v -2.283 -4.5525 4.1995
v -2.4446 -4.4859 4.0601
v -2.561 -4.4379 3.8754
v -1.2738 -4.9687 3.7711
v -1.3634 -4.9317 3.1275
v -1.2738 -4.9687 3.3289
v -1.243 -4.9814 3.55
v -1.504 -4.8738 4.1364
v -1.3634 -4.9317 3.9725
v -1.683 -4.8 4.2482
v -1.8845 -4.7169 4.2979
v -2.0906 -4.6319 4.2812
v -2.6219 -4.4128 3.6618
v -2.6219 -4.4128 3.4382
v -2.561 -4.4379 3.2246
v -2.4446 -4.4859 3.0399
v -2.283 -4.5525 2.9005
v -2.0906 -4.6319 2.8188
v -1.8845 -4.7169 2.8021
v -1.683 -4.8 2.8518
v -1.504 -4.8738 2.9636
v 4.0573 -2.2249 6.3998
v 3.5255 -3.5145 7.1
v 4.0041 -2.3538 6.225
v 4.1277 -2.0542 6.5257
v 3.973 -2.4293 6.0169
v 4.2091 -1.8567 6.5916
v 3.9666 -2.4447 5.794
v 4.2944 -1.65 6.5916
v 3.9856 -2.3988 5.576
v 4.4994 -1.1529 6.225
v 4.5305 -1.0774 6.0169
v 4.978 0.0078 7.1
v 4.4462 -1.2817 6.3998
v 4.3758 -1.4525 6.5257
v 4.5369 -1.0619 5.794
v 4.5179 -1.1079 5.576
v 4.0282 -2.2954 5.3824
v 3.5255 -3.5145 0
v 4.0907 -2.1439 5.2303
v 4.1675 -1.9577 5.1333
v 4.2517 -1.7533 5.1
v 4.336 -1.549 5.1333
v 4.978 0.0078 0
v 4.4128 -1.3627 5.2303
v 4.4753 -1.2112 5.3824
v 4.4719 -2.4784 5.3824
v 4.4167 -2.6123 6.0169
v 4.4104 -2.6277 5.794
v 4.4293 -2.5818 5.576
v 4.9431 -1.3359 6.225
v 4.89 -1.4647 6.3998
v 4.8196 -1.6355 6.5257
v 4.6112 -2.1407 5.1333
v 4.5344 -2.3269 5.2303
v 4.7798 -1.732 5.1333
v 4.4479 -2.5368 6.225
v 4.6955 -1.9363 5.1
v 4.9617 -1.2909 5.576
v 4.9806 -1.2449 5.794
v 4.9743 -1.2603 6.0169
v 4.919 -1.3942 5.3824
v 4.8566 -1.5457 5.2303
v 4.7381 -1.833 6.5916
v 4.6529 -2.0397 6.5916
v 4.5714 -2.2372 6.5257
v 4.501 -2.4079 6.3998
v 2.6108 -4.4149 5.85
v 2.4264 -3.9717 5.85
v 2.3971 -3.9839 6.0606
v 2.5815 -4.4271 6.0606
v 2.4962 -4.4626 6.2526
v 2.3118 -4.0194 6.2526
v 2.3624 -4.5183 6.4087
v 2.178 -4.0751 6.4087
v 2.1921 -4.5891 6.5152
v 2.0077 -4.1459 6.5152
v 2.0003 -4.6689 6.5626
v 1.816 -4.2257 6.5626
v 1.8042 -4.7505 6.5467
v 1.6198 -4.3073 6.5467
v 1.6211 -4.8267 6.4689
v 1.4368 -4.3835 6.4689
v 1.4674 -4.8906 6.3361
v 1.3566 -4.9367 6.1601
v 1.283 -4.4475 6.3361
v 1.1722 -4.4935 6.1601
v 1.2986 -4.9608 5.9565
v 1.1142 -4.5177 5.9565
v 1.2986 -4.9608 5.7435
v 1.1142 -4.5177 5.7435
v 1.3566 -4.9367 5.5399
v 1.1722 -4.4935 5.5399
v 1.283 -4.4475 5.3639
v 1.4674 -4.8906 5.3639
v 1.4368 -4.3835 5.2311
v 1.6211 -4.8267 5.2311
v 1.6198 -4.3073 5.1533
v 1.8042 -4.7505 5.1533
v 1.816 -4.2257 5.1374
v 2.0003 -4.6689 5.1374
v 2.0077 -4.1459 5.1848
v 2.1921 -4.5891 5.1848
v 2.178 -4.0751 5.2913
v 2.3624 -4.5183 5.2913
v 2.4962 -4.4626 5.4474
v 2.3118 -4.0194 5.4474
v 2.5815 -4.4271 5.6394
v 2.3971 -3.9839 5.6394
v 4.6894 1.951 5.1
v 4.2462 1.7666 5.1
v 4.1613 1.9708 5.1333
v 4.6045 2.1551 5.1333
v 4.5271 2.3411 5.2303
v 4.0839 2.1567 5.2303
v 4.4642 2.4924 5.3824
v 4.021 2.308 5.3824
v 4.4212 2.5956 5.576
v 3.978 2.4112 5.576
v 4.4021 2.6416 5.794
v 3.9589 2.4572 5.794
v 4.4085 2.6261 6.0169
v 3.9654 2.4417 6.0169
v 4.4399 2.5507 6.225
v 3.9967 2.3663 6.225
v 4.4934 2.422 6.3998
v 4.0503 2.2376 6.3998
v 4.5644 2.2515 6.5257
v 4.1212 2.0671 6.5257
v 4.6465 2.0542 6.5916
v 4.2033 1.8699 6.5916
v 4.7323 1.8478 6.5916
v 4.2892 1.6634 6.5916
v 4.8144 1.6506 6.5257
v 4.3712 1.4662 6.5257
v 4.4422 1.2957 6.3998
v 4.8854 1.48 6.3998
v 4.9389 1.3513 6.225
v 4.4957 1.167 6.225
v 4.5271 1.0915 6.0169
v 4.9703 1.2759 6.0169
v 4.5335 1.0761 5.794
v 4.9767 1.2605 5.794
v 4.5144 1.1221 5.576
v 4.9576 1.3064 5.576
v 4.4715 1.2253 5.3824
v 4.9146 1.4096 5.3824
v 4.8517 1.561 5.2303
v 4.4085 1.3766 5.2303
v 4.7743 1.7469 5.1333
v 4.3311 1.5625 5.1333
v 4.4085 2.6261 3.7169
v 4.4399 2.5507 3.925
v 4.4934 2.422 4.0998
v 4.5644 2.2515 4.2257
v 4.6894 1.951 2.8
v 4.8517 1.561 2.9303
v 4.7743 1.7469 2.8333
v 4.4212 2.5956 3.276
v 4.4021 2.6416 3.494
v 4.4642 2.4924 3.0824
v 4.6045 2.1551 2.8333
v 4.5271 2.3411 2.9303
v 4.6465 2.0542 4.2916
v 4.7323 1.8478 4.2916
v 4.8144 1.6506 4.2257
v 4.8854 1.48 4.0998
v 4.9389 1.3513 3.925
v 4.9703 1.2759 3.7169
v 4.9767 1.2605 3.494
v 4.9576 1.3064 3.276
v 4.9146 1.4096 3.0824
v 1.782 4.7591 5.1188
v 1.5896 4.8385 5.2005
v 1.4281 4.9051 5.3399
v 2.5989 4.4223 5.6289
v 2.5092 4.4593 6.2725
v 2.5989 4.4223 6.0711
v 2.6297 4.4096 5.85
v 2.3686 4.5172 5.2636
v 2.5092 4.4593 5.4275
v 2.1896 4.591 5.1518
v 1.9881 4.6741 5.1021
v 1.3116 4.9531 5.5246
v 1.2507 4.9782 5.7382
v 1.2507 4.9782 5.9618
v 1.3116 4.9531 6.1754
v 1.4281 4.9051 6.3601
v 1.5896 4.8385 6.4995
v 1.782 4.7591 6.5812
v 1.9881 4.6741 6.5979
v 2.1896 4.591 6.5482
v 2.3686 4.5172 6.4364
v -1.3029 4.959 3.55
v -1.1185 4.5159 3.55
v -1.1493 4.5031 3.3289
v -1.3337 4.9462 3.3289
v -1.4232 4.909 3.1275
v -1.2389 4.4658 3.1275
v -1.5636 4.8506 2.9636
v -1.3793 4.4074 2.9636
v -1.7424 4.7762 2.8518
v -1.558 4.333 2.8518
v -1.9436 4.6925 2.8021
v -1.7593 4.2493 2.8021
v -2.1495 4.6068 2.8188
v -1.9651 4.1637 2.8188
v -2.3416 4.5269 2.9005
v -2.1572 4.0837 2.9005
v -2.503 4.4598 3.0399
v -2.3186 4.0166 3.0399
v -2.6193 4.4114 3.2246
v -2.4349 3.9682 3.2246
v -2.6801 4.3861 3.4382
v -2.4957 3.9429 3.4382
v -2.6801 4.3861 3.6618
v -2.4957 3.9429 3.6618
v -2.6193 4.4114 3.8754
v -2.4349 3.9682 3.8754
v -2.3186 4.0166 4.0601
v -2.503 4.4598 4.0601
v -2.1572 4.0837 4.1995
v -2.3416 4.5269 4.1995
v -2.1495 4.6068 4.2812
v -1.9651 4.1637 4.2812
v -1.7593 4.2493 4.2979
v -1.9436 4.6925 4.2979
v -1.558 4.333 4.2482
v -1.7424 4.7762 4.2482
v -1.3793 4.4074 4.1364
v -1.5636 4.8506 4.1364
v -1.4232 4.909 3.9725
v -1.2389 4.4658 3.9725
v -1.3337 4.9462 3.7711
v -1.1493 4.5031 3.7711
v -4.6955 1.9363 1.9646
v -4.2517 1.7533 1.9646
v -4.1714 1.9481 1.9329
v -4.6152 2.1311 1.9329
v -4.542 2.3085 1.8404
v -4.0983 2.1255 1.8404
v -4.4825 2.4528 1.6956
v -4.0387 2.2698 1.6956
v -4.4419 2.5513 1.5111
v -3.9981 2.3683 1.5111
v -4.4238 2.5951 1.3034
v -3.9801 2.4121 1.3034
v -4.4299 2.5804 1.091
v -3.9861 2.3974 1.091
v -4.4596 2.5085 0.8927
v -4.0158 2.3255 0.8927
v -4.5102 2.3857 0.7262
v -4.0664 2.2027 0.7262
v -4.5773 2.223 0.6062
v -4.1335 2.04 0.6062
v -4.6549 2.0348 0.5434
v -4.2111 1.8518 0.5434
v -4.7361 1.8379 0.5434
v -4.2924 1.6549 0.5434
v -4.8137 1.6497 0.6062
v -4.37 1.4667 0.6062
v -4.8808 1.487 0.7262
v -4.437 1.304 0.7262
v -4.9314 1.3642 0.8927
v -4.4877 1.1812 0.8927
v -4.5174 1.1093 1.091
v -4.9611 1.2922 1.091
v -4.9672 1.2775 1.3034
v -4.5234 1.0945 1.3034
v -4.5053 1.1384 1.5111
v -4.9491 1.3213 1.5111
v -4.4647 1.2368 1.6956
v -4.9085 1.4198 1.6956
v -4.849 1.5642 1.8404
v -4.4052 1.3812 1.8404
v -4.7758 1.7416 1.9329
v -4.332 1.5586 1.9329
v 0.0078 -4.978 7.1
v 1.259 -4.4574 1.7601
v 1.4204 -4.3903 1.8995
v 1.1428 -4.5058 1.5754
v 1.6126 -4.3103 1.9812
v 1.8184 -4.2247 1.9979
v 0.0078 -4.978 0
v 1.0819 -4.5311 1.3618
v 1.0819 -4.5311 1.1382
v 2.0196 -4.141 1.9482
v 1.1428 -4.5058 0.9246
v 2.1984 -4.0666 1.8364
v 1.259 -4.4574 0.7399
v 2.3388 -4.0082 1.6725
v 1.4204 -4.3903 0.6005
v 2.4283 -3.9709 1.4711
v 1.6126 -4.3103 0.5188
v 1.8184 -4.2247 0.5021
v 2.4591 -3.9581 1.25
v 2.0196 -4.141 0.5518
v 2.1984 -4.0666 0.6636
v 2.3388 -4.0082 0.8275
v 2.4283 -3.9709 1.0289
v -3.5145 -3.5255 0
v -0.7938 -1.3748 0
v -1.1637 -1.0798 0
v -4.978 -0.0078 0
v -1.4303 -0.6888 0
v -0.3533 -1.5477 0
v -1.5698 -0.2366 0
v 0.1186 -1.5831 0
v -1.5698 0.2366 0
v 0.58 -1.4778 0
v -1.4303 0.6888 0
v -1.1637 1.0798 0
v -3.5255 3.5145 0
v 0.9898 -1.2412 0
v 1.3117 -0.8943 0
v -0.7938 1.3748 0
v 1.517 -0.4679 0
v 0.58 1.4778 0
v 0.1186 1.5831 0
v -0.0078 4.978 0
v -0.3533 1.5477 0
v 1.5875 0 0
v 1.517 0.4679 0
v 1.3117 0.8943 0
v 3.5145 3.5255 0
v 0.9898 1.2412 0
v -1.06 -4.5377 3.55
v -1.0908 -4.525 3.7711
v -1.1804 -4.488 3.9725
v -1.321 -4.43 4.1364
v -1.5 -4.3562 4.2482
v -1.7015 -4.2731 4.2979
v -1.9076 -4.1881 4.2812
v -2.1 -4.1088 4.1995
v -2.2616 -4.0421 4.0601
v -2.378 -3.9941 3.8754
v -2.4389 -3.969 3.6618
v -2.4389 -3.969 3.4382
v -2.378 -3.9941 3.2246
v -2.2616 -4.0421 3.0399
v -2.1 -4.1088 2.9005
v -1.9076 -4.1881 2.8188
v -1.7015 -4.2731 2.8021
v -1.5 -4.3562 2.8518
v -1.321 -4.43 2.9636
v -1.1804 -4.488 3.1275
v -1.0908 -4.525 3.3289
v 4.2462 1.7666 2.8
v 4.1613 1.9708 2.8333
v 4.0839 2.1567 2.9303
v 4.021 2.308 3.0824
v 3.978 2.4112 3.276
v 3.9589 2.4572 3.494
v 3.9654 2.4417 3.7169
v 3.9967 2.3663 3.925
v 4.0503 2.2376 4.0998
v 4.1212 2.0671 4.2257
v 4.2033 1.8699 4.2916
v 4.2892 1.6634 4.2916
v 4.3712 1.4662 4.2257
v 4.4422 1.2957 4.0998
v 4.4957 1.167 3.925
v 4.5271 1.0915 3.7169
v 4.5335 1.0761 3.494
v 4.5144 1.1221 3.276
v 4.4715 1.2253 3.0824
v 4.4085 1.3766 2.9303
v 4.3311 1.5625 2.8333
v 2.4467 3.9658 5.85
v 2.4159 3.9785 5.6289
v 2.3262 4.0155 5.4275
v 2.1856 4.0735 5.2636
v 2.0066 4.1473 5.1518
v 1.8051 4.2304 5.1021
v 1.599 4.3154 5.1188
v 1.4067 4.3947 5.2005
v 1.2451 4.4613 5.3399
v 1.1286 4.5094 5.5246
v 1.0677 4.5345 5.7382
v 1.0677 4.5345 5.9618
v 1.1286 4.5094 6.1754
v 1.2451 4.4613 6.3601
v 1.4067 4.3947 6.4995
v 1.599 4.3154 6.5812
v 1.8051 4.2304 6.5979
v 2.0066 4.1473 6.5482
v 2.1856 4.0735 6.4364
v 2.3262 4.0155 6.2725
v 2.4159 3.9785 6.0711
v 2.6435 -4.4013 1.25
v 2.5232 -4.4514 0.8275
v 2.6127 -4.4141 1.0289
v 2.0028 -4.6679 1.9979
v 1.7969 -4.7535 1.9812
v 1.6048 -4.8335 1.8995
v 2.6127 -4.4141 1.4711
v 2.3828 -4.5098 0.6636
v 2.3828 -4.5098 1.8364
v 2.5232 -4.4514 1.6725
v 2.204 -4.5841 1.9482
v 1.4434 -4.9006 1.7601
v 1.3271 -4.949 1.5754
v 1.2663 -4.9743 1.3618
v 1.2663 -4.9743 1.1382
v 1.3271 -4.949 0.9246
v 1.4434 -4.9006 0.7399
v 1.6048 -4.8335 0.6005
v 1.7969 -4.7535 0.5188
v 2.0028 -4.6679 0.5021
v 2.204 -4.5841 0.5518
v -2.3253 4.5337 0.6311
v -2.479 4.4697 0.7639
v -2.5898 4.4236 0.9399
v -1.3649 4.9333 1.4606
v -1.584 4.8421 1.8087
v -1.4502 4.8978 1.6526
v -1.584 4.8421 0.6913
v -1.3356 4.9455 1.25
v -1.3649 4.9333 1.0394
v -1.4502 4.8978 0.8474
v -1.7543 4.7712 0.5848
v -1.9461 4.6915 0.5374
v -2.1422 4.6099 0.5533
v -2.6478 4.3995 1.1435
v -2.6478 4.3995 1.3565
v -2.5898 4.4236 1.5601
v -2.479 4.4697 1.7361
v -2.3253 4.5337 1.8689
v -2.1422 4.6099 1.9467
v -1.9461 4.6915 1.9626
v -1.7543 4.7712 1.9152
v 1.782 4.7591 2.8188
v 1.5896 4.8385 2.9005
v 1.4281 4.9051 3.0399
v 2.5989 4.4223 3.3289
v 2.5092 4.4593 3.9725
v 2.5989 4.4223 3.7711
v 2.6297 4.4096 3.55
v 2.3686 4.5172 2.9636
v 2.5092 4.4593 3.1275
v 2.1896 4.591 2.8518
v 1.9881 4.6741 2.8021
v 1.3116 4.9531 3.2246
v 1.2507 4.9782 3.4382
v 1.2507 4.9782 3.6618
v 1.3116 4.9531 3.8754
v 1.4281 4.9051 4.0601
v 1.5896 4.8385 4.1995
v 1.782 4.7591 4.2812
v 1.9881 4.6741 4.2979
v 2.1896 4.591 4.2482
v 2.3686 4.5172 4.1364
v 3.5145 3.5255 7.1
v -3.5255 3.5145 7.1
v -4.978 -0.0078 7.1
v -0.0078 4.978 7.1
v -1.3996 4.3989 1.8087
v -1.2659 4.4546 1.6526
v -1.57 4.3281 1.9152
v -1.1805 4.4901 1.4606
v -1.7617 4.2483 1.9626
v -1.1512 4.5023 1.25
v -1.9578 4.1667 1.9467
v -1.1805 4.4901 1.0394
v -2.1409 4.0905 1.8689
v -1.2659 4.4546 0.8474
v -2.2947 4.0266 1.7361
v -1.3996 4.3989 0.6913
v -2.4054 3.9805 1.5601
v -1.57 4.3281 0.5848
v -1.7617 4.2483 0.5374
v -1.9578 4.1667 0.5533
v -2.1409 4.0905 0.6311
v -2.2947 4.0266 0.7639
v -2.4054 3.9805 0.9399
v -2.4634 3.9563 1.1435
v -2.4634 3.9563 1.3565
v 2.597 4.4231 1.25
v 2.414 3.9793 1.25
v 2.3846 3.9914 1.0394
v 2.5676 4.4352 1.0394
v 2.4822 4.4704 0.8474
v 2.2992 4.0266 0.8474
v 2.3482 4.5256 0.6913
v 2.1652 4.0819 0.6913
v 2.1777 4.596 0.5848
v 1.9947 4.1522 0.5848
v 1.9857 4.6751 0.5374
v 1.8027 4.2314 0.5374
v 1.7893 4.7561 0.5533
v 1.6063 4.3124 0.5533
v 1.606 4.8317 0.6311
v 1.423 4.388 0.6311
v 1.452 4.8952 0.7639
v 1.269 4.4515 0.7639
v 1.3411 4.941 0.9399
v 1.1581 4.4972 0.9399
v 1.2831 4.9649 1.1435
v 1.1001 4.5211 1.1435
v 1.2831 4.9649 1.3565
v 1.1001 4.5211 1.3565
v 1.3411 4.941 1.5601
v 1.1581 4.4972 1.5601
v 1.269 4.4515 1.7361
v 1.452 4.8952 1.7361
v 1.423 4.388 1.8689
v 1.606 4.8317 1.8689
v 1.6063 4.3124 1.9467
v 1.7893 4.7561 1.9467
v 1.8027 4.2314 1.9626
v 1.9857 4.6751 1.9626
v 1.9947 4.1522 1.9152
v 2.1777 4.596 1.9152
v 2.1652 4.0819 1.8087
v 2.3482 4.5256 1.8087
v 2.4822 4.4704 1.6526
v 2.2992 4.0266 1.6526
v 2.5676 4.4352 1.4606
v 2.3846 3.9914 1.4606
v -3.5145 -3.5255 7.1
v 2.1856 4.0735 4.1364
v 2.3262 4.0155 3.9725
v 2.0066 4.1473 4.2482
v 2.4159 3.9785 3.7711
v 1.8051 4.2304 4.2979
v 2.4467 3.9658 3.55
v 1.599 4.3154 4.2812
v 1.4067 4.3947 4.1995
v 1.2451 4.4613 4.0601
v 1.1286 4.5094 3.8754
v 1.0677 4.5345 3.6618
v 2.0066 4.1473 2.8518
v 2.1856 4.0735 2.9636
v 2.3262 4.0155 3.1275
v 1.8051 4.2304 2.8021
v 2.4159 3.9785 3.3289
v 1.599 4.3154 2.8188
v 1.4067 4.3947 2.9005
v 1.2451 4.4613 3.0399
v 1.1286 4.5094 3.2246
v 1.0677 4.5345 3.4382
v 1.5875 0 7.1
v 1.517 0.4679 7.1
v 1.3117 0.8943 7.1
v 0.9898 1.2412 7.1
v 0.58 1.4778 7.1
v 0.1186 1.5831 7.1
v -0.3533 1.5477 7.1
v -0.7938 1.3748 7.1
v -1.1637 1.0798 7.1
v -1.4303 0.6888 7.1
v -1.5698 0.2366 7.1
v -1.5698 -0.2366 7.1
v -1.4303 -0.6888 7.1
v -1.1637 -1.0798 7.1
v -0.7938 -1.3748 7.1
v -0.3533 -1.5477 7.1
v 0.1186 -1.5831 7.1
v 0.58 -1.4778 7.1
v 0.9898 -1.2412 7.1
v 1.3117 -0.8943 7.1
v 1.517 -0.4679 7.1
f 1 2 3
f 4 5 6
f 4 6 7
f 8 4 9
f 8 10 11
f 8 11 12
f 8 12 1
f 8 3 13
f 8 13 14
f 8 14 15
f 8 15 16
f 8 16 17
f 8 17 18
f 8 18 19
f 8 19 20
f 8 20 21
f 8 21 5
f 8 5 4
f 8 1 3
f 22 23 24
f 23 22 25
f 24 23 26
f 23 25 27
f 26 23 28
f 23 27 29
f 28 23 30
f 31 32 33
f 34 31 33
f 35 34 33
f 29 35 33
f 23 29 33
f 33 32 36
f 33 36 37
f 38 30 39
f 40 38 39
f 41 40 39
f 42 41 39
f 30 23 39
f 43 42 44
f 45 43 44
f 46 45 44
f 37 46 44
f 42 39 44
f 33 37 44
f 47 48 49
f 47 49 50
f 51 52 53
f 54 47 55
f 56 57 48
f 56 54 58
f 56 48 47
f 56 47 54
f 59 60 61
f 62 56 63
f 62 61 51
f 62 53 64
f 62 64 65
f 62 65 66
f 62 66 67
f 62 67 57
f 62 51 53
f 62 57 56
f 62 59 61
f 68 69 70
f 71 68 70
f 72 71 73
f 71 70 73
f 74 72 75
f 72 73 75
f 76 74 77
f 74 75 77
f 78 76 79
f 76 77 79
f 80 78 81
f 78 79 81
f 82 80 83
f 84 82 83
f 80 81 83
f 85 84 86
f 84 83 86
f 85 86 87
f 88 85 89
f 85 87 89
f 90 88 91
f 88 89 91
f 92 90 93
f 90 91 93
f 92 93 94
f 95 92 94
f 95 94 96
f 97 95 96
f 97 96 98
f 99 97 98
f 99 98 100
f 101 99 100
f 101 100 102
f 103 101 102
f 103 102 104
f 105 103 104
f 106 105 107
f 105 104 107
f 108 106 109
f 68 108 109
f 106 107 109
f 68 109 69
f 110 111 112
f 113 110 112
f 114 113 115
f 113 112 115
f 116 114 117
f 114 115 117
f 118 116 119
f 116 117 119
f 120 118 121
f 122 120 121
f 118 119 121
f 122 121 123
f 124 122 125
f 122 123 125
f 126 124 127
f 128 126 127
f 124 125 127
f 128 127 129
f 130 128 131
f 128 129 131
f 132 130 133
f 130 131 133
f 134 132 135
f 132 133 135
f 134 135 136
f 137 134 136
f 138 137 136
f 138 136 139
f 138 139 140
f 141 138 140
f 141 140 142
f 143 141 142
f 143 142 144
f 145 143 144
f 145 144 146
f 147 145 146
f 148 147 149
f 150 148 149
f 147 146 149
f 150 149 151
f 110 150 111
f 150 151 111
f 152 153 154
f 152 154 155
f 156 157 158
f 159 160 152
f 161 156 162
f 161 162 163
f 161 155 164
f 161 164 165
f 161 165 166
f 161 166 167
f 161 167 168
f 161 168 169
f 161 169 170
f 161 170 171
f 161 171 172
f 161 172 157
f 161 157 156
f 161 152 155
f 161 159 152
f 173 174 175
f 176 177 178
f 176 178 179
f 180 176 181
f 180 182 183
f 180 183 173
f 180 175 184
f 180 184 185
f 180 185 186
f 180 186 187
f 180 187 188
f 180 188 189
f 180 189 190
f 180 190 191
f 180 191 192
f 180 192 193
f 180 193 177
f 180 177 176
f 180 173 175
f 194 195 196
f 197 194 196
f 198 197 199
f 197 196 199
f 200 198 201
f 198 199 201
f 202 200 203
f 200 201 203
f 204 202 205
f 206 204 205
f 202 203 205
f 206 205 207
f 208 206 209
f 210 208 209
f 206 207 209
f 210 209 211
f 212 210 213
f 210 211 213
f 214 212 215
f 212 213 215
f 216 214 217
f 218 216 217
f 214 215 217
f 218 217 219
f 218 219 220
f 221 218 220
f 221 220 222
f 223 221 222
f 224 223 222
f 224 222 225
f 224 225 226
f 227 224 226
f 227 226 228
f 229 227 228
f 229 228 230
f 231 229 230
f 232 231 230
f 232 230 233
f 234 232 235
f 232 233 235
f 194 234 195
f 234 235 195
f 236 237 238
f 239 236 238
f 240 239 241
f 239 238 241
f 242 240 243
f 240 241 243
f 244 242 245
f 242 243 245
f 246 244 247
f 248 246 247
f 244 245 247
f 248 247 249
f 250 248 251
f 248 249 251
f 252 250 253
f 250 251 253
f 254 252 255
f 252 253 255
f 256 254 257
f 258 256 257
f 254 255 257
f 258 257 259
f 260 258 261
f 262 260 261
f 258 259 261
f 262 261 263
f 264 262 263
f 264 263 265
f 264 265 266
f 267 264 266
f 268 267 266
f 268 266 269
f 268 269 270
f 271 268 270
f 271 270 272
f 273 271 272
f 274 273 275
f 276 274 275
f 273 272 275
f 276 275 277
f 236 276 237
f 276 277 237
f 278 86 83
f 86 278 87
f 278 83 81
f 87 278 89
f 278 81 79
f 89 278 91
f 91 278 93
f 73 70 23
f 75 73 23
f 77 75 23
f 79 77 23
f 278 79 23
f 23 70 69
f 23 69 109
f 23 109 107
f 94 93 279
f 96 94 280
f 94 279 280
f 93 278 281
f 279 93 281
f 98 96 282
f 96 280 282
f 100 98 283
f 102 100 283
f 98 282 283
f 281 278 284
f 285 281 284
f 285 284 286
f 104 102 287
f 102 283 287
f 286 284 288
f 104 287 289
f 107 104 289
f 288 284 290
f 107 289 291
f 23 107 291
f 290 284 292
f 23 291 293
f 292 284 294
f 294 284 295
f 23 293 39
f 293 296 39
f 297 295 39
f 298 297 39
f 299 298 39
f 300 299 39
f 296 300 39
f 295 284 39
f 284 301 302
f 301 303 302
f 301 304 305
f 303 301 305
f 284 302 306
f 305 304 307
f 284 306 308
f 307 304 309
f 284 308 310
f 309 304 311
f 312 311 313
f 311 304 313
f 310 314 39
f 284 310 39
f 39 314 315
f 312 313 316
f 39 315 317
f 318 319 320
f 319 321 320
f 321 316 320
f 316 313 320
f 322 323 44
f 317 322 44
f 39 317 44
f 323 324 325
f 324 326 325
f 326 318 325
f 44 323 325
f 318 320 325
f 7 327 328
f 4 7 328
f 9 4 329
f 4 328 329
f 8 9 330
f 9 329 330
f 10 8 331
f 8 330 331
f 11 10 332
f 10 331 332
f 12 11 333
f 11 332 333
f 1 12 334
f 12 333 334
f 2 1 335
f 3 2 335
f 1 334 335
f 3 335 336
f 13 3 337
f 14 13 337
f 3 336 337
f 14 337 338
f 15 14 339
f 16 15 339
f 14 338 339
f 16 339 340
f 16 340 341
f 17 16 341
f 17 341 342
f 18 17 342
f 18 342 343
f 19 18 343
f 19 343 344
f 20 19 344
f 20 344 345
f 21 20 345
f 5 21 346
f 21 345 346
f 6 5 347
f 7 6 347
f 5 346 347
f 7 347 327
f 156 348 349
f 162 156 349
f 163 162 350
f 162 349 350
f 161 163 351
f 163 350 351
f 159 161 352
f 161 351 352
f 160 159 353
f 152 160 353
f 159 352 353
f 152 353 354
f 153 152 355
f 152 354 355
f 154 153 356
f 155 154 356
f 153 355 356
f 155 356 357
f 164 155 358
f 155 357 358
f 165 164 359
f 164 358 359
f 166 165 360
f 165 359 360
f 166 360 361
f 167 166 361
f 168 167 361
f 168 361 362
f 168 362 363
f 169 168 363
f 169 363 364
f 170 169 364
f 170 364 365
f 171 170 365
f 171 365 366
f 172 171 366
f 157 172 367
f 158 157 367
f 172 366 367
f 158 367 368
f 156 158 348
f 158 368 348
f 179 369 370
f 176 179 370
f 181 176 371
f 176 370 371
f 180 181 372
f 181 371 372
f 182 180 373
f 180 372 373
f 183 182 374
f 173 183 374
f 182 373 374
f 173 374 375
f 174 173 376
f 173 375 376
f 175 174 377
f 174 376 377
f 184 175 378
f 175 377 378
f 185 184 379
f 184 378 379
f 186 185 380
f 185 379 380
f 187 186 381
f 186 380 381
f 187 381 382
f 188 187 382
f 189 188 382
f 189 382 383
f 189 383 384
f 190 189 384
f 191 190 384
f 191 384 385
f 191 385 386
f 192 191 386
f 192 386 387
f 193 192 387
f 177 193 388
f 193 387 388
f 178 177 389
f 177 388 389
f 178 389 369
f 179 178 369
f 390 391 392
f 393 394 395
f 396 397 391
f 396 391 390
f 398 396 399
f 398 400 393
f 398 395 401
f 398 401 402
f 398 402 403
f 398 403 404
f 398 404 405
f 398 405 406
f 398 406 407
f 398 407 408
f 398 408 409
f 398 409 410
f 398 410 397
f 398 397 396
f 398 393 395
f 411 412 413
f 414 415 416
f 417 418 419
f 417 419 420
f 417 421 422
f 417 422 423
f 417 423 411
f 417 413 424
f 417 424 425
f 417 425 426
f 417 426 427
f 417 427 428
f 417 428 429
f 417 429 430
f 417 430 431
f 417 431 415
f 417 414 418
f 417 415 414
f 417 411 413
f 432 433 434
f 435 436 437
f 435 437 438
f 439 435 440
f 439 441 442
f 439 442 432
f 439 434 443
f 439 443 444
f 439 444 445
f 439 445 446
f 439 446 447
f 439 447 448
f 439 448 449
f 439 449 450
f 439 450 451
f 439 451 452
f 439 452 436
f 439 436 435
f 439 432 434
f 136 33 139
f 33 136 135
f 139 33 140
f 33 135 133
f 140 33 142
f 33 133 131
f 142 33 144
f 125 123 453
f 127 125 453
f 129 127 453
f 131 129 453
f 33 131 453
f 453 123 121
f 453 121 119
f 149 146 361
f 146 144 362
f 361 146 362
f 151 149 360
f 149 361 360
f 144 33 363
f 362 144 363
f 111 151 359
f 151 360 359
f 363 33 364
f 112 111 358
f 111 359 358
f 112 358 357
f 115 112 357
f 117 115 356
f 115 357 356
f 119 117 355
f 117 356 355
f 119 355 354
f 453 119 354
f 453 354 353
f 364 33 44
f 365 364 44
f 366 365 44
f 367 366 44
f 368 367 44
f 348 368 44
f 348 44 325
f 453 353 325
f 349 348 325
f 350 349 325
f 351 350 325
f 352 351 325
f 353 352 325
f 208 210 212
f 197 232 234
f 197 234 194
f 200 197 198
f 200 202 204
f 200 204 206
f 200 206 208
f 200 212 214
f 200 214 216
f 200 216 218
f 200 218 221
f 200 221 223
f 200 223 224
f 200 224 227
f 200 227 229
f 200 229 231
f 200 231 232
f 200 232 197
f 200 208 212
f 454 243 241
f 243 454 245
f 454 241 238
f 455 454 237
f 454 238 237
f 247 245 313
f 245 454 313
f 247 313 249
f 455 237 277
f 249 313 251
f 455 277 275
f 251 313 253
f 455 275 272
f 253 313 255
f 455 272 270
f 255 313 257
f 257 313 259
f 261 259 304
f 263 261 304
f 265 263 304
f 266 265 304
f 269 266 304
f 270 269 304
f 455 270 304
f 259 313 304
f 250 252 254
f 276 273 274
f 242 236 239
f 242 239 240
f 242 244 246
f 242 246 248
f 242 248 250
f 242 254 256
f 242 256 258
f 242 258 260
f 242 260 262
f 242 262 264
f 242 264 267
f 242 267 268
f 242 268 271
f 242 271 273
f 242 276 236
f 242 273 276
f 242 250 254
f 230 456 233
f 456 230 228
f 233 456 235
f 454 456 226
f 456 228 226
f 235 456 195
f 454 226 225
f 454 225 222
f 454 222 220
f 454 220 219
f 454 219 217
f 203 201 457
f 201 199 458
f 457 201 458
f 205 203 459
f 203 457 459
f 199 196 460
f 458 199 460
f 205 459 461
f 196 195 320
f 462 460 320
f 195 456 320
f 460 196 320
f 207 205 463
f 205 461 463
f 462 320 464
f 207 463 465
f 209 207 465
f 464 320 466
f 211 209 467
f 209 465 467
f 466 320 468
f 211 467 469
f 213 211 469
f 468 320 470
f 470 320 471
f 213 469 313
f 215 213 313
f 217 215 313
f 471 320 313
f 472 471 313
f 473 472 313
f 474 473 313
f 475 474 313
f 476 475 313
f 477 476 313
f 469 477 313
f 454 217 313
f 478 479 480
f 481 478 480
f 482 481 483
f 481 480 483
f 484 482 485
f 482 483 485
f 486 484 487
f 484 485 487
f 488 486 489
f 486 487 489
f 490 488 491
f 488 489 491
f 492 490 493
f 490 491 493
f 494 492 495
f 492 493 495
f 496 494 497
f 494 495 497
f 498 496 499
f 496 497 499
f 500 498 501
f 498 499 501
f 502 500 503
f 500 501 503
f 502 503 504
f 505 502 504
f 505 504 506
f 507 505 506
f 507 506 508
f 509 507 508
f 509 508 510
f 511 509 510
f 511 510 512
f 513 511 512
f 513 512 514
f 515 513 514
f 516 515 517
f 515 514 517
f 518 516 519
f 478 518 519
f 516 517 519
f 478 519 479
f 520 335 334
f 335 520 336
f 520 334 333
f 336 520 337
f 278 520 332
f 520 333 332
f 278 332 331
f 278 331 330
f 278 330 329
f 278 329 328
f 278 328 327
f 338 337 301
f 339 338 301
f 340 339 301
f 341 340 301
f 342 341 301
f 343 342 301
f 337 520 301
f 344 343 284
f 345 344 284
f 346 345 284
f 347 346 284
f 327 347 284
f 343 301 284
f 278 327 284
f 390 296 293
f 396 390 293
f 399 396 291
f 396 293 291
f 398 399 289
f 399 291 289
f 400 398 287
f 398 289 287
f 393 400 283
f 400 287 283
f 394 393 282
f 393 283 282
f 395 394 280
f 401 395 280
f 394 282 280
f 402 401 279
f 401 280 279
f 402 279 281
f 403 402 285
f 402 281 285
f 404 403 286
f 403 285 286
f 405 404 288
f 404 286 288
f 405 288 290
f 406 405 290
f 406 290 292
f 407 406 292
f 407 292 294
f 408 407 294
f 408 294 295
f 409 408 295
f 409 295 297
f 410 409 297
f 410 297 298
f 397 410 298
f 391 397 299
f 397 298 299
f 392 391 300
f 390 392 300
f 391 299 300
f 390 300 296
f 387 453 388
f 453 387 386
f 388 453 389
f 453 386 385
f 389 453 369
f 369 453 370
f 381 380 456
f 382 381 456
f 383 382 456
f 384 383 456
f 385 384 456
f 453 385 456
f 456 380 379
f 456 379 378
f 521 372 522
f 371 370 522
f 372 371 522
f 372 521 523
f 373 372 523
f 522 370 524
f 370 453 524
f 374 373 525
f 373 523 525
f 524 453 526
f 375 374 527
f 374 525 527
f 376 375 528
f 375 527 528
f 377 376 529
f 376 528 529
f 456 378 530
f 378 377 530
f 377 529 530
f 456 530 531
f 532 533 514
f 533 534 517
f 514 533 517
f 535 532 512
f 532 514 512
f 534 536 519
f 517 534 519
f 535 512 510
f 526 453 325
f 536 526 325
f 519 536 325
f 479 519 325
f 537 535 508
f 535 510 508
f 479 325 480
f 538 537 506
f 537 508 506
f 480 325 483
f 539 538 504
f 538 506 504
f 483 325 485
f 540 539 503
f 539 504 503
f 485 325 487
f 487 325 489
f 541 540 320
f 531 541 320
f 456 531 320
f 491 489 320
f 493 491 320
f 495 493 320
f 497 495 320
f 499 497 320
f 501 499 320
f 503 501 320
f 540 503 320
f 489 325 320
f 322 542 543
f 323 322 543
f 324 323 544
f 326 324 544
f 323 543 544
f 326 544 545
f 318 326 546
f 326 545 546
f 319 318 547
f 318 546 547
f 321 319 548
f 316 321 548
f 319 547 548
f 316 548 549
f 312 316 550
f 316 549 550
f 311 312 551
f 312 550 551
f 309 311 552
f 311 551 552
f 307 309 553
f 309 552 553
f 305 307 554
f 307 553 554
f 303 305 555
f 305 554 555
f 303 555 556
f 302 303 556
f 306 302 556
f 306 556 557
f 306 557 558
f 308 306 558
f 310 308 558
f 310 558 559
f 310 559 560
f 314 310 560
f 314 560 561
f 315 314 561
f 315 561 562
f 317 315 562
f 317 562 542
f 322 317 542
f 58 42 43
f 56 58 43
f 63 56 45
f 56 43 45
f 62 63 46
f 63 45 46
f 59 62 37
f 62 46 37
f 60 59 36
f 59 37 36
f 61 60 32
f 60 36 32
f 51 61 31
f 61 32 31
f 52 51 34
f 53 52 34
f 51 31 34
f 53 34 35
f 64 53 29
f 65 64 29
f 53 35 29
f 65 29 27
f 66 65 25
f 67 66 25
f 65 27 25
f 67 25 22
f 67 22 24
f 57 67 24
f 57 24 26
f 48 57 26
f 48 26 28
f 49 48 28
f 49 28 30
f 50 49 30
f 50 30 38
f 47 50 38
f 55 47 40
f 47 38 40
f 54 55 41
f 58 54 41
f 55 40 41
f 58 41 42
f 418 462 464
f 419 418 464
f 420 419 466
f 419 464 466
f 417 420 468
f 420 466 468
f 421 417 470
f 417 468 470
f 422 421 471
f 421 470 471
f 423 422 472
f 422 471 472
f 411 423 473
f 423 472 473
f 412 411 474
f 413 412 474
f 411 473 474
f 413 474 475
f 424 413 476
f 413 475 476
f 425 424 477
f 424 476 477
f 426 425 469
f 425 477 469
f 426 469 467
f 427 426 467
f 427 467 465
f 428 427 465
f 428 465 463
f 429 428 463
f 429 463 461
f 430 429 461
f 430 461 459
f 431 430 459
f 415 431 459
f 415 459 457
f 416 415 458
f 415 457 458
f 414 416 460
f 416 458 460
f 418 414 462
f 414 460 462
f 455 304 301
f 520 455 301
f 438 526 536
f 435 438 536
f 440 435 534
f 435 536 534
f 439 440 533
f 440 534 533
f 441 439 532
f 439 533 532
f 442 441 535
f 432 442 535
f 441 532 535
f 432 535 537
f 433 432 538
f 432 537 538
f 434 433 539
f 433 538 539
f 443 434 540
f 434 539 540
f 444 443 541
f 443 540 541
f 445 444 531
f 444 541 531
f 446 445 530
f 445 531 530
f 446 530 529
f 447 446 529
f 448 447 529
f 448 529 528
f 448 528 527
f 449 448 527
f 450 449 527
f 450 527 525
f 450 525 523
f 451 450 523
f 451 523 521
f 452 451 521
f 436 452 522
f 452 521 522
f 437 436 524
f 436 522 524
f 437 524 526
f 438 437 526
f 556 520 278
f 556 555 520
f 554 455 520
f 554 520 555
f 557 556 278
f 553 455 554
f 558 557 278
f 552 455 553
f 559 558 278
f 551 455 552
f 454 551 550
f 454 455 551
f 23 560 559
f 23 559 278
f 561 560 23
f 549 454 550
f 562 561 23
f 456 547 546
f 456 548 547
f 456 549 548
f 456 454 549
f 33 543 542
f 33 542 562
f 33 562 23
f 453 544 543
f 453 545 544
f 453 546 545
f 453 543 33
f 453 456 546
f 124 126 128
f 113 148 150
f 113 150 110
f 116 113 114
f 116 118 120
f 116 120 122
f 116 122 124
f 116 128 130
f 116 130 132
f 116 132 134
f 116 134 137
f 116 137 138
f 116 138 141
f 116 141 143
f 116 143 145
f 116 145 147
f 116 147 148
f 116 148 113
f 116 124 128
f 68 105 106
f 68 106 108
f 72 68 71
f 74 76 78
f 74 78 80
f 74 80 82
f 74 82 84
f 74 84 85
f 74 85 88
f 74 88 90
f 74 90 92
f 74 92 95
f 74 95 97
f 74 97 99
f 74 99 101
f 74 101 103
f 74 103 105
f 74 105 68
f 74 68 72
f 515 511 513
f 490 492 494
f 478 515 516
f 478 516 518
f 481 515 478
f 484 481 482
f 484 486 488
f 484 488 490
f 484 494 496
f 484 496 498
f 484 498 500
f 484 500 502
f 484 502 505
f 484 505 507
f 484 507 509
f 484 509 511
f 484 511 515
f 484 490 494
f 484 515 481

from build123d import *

# Parameters (mm, degrees)
BOSS_EXTRUDE1_DEPTH  = 7.1
SKETCH2_R            = 0.714611453
SKETCH2_R_2          = 0.75
BOSS_EXTRUDE2_DEPTH  = 0.48
SKETCH8_R            = 0.75
BOSS_EXTRUDE4_DEPTH  = 0.48
SKETCH9_R            = 0.75
BOSS_EXTRUDE5_DEPTH  = 0.48
SKETCH10_R           = 0.714611453
SKETCH10_R_2         = 0.75
BOSS_EXTRUDE7_DEPTH  = 0.48
SKETCH11_R           = 0.714611453
SKETCH11_R_2         = 0.75
BOSS_EXTRUDE8_DEPTH  = 0.48
SKETCH12_R           = 0.714611453
BOSS_EXTRUDE9_DEPTH  = 0.48
SKETCH13_R           = 0.75
BOSS_EXTRUDE10_DEPTH = 0.48
SKETCH15_R           = 1.5875
CUT_EXTRUDE3_DEPTH   = 8.1


with BuildPart() as part:
    # Sketch1 → Boss-Extrude1 (new body)
    with BuildSketch(Plane.XY):
        Polygon((-0.007801135, 4.977998784), (-3.525492932, 3.514460461), (-4.977998784, -0.007801135), (-3.514460461, -3.525492932), (0.007801135, -4.977998784), (3.525492932, -3.514460461), (4.977998784, 0.007801135), (3.514460461, 3.525492932), align=None)
    extrude(amount=BOSS_EXTRUDE1_DEPTH)

    # Sketch2 → Boss-Extrude2 (add)
    with BuildSketch(Plane(origin=(1.753329663, 4.251745858, 0), x_dir=(0.924478109, -0.381235132, 0), z_dir=(0.381235132, 0.924478109, 0))):
        with Locations((0, -1.25)):
            Circle(SKETCH2_R)
        with Locations((0, -3.55)):
            Circle(SKETCH2_R_2)
        with Locations((0, -5.85)):
            Circle(SKETCH2_R_2)
    extrude(amount=BOSS_EXTRUDE2_DEPTH)

    # Sketch8 → Boss-Extrude4 (add)
    with BuildSketch(Plane(origin=(4.246229622, 1.766647033, 0), x_dir=(0, 0, -1), z_dir=(0.923278687, 0.384130793, 0))):
        with Locations((-3.55, 0)):
            Circle(SKETCH8_R)
        with Locations((-5.85, 0)):
            Circle(SKETCH8_R)
    extrude(amount=BOSS_EXTRUDE4_DEPTH)

    # Sketch9 → Boss-Extrude5 (add)
    with BuildSketch(Plane(origin=(4.251745858, -1.753329663, 0), x_dir=(0, 0, -1), z_dir=(0.924478109, -0.381235132, 0))):
        with Locations((-5.85, 0)):
            Circle(SKETCH9_R)
    extrude(amount=BOSS_EXTRUDE5_DEPTH)

    # Sketch10 → Boss-Extrude7 (add)
    with BuildSketch(Plane(origin=(1.766647033, -4.246229622, 0), x_dir=(0.923278687, 0.384130793, 0), z_dir=(0.384130793, -0.923278687, 0))):
        with Locations((0, 5.85)):
            Circle(SKETCH10_R)
        with Locations((0, 1.25)):
            Circle(SKETCH10_R_2)
    extrude(amount=BOSS_EXTRUDE7_DEPTH)

    # Sketch11 → Boss-Extrude8 (add)
    with BuildSketch(Plane(origin=(-1.766647033, 4.246229622, 0), x_dir=(0.923278687, 0.384130793, 0), z_dir=(-0.384130793, 0.923278687, 0))):
        with Locations((-0.048036035, -1.25)):
            Circle(SKETCH11_R)
        with Locations((-0.048036035, -3.55)):
            Circle(SKETCH11_R_2)
    extrude(amount=BOSS_EXTRUDE8_DEPTH)

    # Sketch12 → Boss-Extrude9 (add)
    with BuildSketch(Plane(origin=(-4.251745858, 1.753329663, 0), x_dir=(0, 0, 1), z_dir=(-0.924478109, 0.381235132, 0))):
        with Locations((1.25, 0)):
            Circle(SKETCH12_R)
    extrude(amount=BOSS_EXTRUDE9_DEPTH)

    # Sketch13 → Boss-Extrude10 (add)
    with BuildSketch(Plane(origin=(-1.753329663, -4.251745858, 0), x_dir=(0.924478109, -0.381235132, 0), z_dir=(-0.381235132, -0.924478109, 0))):
        with Locations((0, 3.55)):
            Circle(SKETCH13_R)
    extrude(amount=BOSS_EXTRUDE10_DEPTH)

    # Sketch15 → Cut-Extrude3 (cut, through all)
    with BuildSketch(Plane.XY.offset(7.1)):
        Circle(SKETCH15_R)
    extrude(amount=-CUT_EXTRUDE3_DEPTH, mode=Mode.SUBTRACT)


solid = part.part
